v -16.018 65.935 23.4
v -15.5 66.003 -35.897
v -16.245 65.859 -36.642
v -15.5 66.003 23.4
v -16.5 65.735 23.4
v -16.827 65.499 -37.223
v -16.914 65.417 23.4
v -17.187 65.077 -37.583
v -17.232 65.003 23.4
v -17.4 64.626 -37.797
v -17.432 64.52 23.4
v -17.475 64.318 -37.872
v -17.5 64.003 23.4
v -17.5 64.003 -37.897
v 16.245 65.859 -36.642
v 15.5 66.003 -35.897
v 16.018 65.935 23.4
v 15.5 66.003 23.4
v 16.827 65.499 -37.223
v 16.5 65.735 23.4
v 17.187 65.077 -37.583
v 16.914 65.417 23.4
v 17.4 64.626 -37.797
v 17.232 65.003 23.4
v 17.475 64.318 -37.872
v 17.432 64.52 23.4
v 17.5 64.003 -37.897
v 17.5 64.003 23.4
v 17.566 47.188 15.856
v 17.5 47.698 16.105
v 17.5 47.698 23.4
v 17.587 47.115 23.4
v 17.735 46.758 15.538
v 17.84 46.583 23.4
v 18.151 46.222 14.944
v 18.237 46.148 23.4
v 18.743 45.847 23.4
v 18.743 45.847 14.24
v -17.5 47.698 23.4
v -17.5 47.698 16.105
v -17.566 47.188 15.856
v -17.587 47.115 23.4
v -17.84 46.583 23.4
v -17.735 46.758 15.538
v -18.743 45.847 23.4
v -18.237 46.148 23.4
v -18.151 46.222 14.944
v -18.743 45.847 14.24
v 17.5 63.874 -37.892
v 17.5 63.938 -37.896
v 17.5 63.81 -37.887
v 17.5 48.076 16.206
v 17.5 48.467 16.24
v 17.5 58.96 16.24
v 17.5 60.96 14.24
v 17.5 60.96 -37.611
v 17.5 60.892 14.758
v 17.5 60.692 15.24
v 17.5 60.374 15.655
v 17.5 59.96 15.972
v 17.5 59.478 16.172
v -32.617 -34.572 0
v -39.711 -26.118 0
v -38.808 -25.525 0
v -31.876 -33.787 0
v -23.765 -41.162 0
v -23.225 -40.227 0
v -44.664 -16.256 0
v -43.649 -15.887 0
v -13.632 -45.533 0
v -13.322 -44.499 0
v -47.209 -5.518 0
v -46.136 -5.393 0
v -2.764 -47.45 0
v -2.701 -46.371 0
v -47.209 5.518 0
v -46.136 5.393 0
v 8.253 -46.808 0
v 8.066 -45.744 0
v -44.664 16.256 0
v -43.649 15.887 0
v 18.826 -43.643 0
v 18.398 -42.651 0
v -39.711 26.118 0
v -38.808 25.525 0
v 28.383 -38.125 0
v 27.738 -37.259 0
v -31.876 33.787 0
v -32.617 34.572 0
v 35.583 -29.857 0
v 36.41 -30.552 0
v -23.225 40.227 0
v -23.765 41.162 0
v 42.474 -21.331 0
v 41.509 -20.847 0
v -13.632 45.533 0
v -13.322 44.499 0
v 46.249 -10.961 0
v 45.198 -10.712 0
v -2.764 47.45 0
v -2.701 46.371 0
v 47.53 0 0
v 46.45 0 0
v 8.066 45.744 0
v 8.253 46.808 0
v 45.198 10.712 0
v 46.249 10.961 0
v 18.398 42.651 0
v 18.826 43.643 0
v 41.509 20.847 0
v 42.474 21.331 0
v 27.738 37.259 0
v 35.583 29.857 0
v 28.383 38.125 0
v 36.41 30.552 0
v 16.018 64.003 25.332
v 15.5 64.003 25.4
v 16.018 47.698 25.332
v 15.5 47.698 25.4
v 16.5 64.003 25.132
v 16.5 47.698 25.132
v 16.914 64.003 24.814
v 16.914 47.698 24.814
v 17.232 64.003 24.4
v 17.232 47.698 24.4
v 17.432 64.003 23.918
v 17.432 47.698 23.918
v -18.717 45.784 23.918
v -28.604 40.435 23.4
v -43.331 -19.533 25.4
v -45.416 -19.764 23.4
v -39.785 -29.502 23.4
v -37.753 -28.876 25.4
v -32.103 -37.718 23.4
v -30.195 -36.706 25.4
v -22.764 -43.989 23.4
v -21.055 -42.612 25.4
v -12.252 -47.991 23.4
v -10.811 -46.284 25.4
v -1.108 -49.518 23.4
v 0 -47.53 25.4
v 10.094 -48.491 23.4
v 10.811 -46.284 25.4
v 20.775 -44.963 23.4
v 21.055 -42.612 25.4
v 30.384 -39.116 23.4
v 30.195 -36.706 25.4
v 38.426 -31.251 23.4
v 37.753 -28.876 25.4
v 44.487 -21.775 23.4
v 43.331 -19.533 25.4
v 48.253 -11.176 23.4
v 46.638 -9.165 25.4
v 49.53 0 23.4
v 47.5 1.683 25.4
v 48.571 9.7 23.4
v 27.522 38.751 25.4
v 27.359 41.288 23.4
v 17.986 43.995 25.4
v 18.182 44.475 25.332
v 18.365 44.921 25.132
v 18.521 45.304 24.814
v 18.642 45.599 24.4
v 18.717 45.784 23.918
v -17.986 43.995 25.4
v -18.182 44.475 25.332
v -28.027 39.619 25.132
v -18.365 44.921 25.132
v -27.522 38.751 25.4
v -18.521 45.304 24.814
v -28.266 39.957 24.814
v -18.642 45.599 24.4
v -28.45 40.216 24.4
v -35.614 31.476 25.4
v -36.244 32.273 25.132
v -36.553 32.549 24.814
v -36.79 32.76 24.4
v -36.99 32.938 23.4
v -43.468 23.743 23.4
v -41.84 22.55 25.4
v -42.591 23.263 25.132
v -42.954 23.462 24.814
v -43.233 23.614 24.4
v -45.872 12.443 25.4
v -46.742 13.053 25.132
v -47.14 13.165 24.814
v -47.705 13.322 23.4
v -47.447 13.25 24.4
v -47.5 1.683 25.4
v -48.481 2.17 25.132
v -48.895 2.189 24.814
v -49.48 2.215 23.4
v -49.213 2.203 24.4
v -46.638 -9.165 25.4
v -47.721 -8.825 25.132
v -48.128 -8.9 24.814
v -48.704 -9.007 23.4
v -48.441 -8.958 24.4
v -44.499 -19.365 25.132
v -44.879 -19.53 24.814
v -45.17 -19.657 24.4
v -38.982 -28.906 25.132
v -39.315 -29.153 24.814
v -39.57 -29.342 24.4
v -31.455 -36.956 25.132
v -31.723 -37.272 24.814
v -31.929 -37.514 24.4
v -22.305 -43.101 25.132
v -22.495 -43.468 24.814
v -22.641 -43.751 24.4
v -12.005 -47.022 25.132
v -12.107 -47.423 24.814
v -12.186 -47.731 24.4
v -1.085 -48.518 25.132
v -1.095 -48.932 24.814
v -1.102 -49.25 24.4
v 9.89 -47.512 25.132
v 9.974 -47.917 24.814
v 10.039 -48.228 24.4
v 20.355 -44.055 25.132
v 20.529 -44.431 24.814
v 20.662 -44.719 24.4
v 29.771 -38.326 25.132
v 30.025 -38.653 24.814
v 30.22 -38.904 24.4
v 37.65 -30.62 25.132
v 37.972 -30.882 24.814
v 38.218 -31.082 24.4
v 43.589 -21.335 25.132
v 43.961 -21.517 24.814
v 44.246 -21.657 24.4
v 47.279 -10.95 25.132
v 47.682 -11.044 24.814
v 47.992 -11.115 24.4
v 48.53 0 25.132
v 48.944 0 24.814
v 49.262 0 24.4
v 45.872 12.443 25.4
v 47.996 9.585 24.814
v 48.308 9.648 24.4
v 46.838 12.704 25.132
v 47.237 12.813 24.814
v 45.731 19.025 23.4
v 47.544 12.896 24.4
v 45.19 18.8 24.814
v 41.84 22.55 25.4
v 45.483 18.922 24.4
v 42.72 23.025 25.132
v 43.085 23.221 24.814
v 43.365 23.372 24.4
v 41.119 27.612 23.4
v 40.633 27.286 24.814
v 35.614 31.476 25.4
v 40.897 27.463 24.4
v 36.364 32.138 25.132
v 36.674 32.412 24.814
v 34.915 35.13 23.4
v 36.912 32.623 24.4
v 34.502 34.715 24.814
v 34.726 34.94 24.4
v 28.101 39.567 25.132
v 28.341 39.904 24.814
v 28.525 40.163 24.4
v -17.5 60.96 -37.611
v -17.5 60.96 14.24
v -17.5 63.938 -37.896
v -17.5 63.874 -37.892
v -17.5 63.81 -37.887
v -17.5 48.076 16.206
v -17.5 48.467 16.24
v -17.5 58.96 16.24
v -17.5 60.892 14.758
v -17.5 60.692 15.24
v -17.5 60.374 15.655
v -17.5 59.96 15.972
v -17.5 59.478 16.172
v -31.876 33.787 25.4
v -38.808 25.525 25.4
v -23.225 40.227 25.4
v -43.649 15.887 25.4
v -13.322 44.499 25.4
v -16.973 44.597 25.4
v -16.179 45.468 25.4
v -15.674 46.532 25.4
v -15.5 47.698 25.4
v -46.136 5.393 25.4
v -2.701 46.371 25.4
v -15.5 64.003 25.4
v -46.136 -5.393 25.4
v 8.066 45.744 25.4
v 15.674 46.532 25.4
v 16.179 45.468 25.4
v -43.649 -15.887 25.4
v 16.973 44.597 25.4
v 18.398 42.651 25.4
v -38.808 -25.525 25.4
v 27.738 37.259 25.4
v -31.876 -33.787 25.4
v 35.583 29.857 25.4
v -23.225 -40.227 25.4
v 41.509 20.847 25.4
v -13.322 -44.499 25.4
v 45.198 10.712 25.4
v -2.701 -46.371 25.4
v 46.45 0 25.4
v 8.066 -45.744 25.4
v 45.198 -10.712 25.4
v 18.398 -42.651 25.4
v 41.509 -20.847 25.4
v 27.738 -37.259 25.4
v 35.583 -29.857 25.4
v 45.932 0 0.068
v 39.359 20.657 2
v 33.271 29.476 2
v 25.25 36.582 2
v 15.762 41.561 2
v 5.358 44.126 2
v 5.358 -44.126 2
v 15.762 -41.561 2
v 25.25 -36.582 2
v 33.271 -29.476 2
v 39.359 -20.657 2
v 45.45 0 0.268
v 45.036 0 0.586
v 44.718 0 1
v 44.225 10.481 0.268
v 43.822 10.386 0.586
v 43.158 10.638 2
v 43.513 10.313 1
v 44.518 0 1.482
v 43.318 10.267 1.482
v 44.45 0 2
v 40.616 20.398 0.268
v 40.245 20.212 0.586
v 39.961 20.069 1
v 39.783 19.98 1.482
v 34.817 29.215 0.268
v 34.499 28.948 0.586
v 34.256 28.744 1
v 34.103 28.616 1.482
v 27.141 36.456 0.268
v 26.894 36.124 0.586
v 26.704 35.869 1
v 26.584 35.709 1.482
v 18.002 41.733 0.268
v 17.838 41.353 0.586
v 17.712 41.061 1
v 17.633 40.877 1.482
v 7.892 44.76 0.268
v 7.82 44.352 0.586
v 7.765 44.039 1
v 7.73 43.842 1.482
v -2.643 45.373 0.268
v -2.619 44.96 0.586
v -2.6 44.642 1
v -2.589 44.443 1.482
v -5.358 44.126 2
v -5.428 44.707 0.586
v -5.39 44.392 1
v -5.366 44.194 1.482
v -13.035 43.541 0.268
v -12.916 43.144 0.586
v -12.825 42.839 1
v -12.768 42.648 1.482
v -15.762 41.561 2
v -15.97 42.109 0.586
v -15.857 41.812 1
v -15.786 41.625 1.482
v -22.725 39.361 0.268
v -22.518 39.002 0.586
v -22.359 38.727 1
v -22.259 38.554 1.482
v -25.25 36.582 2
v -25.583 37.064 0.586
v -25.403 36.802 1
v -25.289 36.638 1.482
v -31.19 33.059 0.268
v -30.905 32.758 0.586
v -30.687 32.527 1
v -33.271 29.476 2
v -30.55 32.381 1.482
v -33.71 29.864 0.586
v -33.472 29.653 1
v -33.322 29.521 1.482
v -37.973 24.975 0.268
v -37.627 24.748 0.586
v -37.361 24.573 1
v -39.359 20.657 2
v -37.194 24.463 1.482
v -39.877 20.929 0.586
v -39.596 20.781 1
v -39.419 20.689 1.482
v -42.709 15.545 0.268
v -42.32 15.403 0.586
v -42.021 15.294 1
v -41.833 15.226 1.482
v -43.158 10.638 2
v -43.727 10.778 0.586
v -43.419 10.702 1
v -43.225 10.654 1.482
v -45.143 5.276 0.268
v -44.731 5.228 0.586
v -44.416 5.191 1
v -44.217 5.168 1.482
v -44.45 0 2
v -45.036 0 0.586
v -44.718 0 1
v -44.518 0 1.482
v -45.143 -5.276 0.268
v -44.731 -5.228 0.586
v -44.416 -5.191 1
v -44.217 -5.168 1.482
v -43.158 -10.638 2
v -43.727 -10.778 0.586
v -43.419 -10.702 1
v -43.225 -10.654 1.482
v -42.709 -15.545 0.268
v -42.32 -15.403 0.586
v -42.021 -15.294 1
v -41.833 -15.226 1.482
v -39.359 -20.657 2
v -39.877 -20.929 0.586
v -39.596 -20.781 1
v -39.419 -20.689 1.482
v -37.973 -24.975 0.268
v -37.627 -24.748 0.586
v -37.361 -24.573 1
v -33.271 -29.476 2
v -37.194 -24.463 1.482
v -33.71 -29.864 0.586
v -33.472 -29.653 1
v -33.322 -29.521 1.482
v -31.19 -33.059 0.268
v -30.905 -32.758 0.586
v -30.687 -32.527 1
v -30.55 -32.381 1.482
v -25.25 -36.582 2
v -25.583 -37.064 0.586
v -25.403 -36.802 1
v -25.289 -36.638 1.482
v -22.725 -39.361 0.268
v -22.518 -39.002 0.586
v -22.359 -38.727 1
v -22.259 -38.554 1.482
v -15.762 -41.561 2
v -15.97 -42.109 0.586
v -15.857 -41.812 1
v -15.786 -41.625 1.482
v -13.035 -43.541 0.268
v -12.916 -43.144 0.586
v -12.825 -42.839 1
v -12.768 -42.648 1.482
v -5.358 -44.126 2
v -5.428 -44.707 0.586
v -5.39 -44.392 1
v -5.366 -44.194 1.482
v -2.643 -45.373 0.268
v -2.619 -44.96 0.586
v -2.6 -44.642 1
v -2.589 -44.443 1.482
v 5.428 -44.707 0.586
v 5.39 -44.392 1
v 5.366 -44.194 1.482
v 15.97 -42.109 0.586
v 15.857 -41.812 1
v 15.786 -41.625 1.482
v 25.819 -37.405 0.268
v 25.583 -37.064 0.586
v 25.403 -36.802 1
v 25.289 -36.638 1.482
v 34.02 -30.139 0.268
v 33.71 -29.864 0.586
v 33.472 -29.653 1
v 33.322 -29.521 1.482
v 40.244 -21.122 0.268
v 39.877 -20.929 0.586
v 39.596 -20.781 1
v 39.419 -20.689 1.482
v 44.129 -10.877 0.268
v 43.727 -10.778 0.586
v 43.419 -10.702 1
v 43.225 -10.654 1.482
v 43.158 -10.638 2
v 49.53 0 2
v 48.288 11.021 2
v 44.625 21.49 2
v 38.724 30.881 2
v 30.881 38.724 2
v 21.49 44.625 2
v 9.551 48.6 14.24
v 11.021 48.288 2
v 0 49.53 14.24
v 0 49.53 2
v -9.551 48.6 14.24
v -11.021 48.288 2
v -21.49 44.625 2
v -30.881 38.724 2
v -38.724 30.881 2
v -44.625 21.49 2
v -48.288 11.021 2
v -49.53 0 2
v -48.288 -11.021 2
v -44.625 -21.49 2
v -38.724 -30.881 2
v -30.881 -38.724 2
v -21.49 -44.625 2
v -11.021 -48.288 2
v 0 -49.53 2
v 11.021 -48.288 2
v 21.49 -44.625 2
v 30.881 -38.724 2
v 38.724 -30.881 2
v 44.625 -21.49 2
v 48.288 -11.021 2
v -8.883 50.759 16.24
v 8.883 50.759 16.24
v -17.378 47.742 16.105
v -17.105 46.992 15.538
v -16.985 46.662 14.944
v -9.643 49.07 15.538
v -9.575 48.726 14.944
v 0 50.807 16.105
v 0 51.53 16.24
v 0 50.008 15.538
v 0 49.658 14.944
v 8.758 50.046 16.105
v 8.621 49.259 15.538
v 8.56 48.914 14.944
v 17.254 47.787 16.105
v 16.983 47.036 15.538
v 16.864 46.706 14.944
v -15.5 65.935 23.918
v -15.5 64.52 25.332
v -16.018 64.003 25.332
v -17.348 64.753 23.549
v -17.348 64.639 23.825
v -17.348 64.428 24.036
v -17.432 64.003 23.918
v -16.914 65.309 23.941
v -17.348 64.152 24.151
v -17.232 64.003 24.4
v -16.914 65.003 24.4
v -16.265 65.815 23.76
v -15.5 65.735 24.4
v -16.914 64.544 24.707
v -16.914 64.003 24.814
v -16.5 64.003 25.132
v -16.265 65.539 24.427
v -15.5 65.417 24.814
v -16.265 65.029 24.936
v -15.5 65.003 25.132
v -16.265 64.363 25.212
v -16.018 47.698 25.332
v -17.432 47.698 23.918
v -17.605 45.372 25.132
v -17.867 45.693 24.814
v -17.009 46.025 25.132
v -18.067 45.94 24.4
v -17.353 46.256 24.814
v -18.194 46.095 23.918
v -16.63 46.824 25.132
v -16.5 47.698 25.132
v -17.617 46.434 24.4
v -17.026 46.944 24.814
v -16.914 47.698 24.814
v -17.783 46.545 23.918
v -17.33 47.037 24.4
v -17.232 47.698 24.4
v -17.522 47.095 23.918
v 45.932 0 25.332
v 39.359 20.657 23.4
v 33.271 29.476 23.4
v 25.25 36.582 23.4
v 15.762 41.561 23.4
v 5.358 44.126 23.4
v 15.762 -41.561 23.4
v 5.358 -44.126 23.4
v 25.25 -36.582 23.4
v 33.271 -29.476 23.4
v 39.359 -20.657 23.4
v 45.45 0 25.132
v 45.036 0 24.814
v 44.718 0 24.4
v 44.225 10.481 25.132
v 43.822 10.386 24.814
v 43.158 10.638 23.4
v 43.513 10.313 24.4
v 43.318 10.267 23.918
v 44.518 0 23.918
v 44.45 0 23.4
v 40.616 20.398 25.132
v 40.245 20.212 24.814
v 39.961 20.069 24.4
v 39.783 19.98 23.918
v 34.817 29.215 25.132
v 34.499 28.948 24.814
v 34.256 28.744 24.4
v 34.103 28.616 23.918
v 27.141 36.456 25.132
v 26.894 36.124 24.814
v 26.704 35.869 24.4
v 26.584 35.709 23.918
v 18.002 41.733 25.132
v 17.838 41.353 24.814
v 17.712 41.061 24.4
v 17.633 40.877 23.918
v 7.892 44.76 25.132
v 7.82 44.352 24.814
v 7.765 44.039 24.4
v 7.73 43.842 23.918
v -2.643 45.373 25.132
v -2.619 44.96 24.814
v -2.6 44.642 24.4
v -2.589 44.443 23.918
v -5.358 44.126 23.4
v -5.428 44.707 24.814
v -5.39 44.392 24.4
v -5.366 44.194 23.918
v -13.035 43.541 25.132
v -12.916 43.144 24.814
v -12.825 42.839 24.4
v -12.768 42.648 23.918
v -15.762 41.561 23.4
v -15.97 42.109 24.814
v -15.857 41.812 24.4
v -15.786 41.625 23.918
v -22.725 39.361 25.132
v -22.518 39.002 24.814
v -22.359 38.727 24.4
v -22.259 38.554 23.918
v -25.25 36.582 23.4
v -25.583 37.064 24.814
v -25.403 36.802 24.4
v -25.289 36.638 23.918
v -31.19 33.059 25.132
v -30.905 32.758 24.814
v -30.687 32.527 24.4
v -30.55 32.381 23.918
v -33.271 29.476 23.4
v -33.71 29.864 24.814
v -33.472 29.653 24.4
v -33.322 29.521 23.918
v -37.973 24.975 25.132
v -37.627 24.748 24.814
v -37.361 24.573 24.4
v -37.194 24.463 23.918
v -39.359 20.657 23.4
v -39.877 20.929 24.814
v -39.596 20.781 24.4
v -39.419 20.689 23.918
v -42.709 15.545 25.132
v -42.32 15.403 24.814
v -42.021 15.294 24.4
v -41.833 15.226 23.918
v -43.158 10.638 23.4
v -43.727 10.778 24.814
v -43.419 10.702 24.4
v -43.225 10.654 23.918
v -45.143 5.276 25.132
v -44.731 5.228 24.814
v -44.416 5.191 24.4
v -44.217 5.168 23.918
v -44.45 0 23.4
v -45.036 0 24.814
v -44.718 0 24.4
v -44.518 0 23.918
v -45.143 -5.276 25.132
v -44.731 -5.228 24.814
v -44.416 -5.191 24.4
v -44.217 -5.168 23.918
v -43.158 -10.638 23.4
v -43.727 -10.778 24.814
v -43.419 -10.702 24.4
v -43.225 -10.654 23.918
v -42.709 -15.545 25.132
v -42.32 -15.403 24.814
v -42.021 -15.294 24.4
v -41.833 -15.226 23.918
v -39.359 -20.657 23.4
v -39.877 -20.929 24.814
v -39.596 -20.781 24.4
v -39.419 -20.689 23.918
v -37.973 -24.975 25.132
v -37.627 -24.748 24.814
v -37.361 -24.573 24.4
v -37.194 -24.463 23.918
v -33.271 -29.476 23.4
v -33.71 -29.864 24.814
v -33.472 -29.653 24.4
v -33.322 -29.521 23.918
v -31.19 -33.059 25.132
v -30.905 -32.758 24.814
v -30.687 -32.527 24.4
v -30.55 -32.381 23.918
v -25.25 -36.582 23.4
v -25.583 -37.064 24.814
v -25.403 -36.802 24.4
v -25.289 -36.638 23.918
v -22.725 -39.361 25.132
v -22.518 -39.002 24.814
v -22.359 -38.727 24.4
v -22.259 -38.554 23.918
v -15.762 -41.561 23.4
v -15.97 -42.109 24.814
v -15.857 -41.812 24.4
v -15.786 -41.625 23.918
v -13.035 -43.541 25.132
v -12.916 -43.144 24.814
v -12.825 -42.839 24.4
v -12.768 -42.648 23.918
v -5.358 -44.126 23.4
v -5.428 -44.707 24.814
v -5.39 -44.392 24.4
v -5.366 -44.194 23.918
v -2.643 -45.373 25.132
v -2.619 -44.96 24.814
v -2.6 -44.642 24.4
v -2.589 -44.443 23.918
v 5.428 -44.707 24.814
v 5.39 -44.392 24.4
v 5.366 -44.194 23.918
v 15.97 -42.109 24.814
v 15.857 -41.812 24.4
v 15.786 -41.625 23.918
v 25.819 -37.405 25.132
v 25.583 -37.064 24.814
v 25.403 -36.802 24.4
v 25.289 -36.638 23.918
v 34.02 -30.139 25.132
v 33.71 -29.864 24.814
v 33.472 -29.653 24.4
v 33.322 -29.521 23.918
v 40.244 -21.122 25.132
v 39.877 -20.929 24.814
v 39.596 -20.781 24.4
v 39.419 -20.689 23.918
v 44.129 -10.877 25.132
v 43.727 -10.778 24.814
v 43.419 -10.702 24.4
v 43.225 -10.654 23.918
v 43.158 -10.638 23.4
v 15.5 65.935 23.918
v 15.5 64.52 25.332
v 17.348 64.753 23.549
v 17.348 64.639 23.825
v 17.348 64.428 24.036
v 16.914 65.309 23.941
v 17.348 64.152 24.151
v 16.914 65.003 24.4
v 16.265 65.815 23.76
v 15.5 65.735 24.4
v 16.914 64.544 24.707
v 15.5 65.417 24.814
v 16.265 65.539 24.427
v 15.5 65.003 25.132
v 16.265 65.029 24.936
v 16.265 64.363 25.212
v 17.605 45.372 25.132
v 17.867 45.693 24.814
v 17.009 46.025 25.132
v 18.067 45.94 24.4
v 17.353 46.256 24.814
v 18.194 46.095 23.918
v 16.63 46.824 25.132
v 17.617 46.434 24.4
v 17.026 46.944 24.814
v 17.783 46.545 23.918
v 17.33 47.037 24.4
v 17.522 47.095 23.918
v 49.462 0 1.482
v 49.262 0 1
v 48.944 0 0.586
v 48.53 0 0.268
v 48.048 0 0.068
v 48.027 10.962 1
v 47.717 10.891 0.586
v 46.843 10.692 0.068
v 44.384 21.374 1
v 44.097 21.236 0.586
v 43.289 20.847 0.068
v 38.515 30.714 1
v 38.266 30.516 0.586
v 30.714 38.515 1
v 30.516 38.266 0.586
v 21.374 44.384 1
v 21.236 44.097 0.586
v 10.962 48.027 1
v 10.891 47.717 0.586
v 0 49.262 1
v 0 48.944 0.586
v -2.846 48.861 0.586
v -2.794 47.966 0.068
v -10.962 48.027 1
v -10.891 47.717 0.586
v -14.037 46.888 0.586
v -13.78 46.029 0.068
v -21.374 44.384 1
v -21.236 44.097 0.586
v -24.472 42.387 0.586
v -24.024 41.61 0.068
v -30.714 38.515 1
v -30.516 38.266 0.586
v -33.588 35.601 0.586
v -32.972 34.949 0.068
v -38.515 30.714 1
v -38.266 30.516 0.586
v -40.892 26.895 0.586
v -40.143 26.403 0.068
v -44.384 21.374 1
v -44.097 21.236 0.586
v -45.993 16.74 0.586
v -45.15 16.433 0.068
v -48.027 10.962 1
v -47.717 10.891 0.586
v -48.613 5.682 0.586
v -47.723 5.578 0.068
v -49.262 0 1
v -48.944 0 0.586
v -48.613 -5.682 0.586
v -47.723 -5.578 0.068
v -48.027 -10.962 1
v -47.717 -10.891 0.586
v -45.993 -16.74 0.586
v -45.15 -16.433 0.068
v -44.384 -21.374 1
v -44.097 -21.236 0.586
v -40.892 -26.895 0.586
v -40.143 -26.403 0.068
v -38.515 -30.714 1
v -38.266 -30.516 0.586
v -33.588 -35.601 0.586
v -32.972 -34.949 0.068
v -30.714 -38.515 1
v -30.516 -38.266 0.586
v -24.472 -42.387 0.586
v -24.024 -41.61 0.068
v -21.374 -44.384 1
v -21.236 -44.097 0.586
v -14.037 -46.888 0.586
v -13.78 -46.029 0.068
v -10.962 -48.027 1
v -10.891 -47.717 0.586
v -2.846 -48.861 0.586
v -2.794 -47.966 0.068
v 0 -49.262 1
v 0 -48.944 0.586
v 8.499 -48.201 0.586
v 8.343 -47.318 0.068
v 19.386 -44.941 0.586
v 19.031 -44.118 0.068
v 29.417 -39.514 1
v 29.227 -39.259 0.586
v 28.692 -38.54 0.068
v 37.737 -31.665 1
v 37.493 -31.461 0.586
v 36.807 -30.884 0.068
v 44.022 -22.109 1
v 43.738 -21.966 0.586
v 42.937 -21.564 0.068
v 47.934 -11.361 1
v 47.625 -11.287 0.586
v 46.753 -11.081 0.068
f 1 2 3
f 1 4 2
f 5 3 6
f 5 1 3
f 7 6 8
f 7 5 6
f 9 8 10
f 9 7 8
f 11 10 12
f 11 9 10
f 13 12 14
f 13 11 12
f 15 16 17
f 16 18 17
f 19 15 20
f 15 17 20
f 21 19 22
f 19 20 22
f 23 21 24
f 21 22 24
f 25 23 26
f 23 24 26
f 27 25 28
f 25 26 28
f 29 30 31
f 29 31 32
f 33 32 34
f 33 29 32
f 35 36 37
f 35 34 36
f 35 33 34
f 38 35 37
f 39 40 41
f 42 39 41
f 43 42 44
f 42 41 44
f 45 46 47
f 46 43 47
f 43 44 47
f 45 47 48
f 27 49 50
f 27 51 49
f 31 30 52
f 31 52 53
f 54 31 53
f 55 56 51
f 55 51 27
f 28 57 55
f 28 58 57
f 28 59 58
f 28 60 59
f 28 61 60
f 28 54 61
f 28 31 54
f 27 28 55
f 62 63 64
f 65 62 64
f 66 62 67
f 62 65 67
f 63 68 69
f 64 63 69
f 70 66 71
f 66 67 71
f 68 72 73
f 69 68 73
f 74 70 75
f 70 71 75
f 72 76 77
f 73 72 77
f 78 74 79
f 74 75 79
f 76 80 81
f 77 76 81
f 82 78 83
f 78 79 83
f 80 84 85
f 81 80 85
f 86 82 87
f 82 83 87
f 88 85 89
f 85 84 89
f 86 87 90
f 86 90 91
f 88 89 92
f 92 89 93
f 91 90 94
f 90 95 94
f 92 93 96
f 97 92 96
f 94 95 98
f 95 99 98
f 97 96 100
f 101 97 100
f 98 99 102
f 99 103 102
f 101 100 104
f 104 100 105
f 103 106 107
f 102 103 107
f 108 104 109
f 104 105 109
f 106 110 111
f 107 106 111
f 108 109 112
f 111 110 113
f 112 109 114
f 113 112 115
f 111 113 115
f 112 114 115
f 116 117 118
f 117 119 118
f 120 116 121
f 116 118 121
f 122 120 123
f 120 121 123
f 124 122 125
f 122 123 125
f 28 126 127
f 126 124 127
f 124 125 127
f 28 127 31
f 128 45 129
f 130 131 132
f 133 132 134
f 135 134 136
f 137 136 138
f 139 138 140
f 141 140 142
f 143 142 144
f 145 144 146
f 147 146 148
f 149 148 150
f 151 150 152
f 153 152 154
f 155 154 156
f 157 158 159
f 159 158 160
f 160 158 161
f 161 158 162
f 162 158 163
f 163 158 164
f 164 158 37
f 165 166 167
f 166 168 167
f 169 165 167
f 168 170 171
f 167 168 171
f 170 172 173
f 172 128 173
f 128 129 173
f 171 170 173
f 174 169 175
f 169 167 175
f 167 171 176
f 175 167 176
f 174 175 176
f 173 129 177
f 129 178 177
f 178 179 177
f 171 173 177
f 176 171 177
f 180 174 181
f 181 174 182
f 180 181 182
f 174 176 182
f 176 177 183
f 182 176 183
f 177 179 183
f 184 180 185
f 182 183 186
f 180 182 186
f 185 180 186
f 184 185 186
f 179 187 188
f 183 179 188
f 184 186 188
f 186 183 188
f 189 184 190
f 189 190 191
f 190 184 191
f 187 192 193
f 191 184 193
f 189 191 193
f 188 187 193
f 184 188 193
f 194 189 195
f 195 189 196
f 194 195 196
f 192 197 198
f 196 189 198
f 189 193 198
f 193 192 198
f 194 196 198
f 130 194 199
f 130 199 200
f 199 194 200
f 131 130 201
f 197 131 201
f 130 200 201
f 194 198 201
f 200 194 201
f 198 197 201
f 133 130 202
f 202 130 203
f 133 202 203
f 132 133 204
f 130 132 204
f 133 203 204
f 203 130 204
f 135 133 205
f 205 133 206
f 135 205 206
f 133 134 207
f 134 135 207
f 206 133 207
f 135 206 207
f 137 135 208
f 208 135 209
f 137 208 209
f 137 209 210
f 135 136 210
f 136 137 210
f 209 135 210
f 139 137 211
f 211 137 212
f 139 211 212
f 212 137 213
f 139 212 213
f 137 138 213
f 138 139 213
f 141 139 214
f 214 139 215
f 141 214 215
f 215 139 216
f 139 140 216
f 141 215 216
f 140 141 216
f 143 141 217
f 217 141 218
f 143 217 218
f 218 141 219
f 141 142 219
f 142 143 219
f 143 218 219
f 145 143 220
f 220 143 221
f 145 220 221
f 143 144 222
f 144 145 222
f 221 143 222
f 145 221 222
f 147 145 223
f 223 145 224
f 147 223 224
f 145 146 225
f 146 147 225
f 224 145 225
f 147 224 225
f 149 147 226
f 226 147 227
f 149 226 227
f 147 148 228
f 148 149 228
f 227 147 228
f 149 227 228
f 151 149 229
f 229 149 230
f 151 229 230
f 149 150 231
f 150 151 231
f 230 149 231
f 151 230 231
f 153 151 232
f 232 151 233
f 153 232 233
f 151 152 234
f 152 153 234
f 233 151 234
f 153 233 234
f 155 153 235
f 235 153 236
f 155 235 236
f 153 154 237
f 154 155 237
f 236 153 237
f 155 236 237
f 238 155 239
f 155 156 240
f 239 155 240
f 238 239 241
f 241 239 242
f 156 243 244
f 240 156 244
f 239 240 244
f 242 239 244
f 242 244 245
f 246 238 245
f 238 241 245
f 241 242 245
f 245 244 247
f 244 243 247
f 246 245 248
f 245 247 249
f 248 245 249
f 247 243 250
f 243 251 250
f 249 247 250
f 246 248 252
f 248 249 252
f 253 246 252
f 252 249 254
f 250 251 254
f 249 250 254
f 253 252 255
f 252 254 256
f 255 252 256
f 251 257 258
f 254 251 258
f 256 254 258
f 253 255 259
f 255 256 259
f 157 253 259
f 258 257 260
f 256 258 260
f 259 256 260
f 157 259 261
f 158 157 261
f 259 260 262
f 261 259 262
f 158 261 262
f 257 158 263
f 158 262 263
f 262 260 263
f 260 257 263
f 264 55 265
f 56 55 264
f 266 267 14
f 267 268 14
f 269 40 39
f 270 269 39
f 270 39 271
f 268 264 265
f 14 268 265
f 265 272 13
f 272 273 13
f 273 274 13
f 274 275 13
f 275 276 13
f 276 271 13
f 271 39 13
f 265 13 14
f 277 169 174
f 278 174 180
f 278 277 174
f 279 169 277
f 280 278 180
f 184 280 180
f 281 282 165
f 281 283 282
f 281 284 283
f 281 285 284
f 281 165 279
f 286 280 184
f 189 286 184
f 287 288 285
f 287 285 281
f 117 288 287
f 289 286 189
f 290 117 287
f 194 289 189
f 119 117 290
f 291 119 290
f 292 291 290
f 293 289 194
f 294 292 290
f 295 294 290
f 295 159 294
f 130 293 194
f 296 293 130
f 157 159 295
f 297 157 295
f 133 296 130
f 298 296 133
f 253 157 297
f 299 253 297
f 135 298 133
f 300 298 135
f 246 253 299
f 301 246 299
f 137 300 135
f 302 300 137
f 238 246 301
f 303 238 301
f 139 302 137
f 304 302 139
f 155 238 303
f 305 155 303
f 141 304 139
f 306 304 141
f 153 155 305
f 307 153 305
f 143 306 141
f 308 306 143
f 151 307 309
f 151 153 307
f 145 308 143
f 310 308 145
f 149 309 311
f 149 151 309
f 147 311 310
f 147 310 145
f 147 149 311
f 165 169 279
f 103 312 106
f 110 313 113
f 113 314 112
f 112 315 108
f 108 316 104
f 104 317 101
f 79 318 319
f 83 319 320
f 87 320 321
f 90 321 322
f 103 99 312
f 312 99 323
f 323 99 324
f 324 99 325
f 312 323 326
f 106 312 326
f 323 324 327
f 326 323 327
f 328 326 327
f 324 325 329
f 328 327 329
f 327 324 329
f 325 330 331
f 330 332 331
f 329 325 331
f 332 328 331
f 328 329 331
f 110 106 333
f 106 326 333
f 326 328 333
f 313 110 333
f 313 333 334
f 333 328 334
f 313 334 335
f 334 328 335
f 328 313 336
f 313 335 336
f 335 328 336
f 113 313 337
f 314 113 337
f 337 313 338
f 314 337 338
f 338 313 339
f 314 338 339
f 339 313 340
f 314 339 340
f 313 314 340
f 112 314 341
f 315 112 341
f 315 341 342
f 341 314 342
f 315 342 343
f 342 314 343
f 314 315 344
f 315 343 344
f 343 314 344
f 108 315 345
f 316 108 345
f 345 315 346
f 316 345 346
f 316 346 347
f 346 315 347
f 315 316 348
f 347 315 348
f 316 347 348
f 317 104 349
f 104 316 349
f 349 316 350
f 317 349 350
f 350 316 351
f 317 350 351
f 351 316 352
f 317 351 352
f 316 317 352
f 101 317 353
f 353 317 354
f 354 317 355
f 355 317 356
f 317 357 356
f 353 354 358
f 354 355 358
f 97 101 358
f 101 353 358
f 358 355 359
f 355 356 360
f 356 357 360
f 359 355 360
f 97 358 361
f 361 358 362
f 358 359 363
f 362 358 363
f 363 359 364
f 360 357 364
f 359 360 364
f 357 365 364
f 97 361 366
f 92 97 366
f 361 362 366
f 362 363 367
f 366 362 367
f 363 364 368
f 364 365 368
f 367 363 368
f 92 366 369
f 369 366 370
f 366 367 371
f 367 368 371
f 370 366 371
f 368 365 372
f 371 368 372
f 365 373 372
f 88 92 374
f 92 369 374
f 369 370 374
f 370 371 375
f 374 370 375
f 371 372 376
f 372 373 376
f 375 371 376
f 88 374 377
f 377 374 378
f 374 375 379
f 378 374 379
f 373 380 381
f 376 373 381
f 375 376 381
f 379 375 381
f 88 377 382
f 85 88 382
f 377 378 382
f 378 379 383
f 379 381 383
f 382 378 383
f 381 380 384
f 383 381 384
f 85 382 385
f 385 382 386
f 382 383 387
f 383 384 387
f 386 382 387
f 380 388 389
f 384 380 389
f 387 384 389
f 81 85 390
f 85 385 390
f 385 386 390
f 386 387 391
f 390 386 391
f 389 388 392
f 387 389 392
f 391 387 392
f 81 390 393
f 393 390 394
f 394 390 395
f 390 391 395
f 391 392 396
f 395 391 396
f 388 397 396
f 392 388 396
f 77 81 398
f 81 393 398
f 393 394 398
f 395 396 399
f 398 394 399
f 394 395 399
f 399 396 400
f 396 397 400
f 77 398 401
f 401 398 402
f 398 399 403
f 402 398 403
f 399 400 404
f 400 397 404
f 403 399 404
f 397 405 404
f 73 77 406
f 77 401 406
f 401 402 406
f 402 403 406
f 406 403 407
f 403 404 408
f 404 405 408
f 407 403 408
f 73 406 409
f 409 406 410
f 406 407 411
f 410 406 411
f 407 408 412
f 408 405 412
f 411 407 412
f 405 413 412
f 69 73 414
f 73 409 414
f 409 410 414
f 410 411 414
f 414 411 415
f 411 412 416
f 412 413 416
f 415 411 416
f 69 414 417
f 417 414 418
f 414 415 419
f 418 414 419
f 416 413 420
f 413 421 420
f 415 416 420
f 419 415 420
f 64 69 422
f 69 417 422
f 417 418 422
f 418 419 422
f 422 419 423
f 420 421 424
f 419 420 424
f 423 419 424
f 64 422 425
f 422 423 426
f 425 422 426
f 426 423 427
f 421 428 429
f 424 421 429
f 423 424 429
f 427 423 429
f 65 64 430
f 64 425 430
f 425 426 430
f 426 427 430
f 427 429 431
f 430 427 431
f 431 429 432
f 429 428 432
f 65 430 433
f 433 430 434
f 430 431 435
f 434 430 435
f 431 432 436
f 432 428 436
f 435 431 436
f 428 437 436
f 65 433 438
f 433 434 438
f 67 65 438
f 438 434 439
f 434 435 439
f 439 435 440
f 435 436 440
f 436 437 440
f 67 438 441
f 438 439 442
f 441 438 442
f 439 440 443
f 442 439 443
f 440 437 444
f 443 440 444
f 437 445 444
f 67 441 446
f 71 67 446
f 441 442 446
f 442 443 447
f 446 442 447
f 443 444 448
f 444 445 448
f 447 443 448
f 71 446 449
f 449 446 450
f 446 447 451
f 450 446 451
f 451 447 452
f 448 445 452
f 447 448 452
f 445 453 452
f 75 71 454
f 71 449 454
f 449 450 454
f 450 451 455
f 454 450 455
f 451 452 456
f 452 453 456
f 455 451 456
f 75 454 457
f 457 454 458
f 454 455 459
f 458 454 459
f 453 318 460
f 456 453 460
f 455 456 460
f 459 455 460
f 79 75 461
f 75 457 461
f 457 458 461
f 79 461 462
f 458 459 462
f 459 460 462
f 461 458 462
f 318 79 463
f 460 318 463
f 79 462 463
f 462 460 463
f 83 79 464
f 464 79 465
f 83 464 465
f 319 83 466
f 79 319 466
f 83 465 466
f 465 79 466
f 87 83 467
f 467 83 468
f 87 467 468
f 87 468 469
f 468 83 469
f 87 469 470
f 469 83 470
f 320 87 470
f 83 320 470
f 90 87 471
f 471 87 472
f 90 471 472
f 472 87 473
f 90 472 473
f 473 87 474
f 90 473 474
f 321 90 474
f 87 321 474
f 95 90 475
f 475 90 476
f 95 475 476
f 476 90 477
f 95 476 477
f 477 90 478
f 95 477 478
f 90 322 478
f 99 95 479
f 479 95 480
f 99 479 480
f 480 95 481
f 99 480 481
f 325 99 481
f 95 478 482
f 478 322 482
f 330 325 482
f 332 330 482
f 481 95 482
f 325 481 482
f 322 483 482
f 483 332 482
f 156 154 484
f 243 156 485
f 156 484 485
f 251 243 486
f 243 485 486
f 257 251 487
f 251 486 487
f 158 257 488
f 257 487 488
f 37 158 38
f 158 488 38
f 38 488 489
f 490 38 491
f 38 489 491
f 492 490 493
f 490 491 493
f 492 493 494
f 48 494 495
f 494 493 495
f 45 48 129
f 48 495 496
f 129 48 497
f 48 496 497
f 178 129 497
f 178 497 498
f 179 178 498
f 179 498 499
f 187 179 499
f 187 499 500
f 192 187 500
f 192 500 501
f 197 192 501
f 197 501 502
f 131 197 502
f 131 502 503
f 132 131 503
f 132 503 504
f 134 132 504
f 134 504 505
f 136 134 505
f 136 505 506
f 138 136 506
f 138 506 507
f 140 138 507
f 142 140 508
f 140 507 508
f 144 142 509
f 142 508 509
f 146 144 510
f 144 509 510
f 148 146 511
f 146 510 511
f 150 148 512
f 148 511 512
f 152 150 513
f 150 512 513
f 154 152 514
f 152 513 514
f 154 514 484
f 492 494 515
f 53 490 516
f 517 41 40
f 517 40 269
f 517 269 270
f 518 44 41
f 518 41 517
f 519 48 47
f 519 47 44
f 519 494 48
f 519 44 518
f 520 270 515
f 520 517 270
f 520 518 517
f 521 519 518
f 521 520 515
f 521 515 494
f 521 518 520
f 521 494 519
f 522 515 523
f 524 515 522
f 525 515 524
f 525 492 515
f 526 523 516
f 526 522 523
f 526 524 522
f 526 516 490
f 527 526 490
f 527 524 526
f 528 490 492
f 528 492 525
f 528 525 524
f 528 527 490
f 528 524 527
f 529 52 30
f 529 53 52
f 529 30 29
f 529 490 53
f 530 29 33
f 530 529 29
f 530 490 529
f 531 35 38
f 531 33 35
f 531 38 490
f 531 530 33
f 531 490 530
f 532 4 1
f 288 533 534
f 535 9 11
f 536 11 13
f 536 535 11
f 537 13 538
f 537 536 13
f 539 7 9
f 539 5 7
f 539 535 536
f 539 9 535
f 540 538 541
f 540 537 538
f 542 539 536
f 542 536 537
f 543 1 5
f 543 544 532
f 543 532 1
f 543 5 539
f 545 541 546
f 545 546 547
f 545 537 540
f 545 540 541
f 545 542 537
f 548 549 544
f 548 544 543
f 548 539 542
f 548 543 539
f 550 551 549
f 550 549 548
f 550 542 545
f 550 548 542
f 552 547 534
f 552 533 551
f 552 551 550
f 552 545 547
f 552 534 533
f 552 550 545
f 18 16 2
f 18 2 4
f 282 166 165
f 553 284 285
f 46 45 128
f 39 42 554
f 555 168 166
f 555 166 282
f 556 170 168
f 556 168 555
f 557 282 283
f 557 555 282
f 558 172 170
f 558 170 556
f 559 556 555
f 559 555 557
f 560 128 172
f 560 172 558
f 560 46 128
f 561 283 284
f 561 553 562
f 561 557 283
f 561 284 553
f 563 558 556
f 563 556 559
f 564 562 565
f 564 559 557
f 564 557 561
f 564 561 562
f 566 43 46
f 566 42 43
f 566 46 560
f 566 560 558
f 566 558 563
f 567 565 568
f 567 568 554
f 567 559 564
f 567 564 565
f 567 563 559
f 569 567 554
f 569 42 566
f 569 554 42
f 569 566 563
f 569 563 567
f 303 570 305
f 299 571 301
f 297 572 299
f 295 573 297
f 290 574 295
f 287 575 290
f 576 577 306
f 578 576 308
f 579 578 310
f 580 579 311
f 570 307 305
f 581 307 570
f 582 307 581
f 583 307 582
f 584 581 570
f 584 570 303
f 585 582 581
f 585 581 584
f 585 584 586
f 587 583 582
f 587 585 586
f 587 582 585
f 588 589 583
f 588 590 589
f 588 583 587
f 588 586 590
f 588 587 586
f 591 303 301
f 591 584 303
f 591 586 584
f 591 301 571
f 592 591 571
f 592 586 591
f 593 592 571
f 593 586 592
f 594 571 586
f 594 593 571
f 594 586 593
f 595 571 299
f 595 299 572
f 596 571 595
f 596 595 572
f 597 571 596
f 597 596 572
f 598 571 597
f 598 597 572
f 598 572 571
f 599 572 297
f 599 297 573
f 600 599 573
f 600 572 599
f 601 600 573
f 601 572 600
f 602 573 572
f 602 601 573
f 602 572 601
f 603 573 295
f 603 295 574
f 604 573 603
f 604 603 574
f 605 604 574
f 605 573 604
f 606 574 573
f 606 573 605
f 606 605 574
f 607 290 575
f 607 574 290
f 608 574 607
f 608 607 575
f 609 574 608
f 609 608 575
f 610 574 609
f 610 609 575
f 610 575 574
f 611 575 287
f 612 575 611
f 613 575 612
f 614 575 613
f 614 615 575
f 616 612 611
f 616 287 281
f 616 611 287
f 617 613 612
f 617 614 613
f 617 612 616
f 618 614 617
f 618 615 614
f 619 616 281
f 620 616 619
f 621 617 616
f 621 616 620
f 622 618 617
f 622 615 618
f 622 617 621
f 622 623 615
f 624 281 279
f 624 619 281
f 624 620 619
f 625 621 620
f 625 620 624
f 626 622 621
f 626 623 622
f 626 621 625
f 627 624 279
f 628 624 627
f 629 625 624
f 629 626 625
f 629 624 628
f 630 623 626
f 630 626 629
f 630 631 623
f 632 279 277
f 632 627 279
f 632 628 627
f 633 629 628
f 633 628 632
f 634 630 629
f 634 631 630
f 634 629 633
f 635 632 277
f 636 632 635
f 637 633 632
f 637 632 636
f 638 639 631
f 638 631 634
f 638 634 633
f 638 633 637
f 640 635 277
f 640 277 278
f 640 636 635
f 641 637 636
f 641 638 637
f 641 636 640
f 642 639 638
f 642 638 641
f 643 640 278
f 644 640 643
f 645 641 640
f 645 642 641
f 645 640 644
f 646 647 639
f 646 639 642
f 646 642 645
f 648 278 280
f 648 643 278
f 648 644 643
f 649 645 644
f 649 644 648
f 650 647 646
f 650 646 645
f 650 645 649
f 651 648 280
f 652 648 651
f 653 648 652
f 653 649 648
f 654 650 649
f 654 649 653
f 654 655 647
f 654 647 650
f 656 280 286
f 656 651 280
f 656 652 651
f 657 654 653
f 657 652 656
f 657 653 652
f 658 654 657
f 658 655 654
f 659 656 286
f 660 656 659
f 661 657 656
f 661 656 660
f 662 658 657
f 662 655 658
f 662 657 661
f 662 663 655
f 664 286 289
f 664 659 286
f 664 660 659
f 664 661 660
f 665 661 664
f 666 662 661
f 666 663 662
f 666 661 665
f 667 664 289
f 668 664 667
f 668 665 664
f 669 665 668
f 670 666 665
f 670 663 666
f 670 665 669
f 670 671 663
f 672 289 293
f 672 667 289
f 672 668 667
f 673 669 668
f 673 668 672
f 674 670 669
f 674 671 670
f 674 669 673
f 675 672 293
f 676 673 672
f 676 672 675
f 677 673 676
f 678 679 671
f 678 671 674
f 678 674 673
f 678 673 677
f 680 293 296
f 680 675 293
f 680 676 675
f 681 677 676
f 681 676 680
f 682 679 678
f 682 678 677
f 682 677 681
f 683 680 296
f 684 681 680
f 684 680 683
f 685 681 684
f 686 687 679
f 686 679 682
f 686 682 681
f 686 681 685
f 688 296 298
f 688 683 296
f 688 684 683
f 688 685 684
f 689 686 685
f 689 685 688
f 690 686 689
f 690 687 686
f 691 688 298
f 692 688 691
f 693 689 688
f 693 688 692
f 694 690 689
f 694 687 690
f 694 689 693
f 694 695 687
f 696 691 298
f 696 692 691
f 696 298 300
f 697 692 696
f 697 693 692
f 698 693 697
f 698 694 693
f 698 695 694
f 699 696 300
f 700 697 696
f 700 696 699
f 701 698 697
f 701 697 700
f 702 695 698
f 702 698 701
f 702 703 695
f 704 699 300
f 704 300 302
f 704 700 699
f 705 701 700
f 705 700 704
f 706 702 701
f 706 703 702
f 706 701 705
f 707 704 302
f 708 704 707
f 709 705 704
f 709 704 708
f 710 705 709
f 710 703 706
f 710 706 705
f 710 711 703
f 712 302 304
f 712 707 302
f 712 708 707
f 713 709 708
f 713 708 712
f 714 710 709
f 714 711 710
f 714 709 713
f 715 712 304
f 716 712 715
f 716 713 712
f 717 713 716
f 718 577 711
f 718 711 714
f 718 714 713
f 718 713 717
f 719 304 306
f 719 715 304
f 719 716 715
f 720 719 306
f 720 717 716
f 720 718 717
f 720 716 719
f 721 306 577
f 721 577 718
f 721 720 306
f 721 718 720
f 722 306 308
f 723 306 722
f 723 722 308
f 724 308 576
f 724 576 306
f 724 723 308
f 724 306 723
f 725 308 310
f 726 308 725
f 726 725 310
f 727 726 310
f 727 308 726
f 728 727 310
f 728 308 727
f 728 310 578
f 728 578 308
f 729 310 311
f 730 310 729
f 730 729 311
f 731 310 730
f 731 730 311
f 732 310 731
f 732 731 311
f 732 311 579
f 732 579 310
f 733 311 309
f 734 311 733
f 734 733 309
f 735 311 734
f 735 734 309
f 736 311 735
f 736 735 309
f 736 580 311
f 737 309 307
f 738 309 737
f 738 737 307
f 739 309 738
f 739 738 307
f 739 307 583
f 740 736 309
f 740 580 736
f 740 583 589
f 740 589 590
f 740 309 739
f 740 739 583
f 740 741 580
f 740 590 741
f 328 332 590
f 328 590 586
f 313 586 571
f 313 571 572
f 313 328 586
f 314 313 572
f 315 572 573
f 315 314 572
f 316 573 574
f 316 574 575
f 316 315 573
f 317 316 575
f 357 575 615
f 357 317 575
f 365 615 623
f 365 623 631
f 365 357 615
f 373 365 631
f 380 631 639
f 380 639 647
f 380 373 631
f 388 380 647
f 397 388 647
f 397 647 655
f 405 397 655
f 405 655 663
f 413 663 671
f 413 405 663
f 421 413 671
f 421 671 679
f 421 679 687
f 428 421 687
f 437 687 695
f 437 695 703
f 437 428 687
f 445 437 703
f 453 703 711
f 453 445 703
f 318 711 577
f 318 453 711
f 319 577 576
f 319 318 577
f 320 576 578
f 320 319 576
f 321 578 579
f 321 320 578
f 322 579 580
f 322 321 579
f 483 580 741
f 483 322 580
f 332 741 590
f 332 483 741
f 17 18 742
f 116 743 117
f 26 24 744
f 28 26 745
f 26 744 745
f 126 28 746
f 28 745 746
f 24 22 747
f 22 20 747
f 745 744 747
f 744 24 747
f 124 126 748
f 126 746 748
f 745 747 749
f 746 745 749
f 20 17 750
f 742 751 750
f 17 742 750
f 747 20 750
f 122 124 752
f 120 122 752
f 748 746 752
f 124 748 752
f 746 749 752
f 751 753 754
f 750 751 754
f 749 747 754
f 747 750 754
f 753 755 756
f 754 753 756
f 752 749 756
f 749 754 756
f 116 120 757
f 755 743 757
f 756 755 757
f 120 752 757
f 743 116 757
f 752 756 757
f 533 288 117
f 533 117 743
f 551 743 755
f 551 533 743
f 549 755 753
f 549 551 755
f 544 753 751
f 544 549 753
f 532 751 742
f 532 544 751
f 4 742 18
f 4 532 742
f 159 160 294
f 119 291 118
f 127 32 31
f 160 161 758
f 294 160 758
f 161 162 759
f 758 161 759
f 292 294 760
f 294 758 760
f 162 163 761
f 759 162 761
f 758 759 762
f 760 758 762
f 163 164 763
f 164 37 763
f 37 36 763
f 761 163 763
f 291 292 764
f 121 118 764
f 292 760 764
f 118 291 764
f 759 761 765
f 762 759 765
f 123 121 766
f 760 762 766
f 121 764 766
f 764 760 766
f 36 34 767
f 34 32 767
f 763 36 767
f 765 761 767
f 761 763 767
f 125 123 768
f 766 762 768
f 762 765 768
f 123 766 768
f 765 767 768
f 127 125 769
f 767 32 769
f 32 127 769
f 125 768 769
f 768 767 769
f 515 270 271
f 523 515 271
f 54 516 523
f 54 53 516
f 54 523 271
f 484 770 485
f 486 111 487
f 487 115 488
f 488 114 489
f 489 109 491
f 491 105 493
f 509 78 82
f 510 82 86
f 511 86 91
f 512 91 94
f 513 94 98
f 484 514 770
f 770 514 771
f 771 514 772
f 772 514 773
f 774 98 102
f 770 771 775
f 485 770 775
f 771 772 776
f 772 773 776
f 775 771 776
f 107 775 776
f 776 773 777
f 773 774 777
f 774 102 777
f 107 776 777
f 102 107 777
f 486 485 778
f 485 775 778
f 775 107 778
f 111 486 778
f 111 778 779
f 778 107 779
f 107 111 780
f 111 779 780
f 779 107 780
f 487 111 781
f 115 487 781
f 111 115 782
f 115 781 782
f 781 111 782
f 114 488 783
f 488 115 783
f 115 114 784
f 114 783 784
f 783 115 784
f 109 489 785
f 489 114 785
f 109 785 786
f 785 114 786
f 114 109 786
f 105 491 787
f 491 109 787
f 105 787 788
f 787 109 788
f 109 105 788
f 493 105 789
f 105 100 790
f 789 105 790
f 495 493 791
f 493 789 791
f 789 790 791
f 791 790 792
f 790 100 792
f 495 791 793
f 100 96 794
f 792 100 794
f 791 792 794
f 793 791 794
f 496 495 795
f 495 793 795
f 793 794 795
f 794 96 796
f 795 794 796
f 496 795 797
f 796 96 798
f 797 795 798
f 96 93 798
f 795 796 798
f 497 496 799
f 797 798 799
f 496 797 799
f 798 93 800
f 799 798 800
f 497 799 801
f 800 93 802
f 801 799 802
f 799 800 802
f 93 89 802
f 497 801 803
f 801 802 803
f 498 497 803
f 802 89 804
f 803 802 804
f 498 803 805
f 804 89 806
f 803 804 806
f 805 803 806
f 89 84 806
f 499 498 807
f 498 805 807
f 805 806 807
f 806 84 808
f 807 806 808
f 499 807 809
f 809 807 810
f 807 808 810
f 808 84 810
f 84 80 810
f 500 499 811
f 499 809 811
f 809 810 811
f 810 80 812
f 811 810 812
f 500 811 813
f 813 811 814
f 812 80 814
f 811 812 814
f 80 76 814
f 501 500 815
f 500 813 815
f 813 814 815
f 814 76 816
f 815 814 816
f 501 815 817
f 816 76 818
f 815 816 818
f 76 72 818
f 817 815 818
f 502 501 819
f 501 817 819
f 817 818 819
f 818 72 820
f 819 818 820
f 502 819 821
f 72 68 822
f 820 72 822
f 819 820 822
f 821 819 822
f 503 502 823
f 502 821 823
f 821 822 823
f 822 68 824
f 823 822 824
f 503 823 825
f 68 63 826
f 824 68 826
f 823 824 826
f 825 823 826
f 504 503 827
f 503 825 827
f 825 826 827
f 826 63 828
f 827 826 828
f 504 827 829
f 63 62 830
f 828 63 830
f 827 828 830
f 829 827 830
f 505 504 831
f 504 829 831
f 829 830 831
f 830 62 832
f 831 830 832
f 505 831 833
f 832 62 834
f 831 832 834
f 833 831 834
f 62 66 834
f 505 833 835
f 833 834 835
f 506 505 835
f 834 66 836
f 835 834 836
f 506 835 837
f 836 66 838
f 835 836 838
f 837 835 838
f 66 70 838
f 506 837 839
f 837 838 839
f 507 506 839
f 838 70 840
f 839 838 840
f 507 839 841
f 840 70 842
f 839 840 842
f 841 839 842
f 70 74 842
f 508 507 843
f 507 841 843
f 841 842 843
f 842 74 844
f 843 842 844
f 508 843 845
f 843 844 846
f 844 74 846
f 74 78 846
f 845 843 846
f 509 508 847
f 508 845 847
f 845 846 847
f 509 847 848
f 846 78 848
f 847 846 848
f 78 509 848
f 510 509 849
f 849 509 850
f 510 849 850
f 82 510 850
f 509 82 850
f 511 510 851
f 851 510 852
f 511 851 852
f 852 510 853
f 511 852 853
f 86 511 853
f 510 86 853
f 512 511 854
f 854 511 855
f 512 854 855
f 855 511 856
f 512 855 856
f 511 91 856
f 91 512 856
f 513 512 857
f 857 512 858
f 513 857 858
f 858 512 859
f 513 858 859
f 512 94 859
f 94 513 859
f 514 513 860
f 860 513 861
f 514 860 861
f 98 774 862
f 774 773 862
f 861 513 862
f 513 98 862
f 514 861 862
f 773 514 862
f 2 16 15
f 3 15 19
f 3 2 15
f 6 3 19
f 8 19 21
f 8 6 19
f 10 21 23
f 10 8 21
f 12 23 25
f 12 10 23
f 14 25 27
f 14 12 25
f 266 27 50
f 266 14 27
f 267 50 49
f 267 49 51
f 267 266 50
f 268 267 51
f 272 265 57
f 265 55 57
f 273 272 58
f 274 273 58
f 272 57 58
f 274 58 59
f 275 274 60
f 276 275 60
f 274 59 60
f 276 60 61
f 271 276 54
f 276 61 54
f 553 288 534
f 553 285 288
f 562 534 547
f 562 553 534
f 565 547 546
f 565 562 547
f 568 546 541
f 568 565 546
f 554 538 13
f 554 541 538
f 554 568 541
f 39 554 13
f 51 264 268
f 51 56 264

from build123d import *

# Parameters (mm, degrees)
F0_R     = 49.53
F0_R_2   = 44.45
F1_DEPTH = 25.4
F3_DEPTH = 17.5
F4_R     = 2


with BuildPart() as f1:
    # F0 (on Top) → F1 (new body)
    with BuildSketch(Plane.XY):
        Circle(F0_R)
        Circle(F0_R_2, mode=Mode.SUBTRACT)
    extrude(amount=F1_DEPTH)

    # F2 (on Right) → F3 (join, symmetric)
    with BuildSketch(Plane.YZ):
        Polygon((66.002712847, 25.4), (45.682712847, 25.4), (45.682712847, 16.2404105067), (60.96, 16.2404105067), (60.96, -37.6108922064), (66.002712847, -38.1), align=None)
    extrude(amount=F3_DEPTH, both=True)

    # F4
    f4_edges = [f1.edges().sort_by_distance(p)[0] for p in [
        (0, 60.96, 16.240411),
        (0, 49.53, 16.240411),
        (17.5, 46.335417, 20.820205),
        (-17.5, 46.335417, 20.820205),
        (0, 66.002713, 25.4),
        (-44.45, 0, 25.4),
        (-49.53, 0, 0),
        (49.53, 0, 12.7),
        (-28.164214, -40.743072, 25.4),
        (40.743072, 28.164214, 25.4),
        (44.45, 0, 12.7),
        (-44.45, 0, 0),
        (-17.5, 66.002713, -6.35),
        (17.5, 66.002713, -6.35),
        (0, 66.002713, -38.1),
        (17.5, 56.169065, 25.4),
        (-17.5, 56.169065, 25.4),
    ]]
    fillet(f4_edges, radius=F4_R)


solid = f1.part
